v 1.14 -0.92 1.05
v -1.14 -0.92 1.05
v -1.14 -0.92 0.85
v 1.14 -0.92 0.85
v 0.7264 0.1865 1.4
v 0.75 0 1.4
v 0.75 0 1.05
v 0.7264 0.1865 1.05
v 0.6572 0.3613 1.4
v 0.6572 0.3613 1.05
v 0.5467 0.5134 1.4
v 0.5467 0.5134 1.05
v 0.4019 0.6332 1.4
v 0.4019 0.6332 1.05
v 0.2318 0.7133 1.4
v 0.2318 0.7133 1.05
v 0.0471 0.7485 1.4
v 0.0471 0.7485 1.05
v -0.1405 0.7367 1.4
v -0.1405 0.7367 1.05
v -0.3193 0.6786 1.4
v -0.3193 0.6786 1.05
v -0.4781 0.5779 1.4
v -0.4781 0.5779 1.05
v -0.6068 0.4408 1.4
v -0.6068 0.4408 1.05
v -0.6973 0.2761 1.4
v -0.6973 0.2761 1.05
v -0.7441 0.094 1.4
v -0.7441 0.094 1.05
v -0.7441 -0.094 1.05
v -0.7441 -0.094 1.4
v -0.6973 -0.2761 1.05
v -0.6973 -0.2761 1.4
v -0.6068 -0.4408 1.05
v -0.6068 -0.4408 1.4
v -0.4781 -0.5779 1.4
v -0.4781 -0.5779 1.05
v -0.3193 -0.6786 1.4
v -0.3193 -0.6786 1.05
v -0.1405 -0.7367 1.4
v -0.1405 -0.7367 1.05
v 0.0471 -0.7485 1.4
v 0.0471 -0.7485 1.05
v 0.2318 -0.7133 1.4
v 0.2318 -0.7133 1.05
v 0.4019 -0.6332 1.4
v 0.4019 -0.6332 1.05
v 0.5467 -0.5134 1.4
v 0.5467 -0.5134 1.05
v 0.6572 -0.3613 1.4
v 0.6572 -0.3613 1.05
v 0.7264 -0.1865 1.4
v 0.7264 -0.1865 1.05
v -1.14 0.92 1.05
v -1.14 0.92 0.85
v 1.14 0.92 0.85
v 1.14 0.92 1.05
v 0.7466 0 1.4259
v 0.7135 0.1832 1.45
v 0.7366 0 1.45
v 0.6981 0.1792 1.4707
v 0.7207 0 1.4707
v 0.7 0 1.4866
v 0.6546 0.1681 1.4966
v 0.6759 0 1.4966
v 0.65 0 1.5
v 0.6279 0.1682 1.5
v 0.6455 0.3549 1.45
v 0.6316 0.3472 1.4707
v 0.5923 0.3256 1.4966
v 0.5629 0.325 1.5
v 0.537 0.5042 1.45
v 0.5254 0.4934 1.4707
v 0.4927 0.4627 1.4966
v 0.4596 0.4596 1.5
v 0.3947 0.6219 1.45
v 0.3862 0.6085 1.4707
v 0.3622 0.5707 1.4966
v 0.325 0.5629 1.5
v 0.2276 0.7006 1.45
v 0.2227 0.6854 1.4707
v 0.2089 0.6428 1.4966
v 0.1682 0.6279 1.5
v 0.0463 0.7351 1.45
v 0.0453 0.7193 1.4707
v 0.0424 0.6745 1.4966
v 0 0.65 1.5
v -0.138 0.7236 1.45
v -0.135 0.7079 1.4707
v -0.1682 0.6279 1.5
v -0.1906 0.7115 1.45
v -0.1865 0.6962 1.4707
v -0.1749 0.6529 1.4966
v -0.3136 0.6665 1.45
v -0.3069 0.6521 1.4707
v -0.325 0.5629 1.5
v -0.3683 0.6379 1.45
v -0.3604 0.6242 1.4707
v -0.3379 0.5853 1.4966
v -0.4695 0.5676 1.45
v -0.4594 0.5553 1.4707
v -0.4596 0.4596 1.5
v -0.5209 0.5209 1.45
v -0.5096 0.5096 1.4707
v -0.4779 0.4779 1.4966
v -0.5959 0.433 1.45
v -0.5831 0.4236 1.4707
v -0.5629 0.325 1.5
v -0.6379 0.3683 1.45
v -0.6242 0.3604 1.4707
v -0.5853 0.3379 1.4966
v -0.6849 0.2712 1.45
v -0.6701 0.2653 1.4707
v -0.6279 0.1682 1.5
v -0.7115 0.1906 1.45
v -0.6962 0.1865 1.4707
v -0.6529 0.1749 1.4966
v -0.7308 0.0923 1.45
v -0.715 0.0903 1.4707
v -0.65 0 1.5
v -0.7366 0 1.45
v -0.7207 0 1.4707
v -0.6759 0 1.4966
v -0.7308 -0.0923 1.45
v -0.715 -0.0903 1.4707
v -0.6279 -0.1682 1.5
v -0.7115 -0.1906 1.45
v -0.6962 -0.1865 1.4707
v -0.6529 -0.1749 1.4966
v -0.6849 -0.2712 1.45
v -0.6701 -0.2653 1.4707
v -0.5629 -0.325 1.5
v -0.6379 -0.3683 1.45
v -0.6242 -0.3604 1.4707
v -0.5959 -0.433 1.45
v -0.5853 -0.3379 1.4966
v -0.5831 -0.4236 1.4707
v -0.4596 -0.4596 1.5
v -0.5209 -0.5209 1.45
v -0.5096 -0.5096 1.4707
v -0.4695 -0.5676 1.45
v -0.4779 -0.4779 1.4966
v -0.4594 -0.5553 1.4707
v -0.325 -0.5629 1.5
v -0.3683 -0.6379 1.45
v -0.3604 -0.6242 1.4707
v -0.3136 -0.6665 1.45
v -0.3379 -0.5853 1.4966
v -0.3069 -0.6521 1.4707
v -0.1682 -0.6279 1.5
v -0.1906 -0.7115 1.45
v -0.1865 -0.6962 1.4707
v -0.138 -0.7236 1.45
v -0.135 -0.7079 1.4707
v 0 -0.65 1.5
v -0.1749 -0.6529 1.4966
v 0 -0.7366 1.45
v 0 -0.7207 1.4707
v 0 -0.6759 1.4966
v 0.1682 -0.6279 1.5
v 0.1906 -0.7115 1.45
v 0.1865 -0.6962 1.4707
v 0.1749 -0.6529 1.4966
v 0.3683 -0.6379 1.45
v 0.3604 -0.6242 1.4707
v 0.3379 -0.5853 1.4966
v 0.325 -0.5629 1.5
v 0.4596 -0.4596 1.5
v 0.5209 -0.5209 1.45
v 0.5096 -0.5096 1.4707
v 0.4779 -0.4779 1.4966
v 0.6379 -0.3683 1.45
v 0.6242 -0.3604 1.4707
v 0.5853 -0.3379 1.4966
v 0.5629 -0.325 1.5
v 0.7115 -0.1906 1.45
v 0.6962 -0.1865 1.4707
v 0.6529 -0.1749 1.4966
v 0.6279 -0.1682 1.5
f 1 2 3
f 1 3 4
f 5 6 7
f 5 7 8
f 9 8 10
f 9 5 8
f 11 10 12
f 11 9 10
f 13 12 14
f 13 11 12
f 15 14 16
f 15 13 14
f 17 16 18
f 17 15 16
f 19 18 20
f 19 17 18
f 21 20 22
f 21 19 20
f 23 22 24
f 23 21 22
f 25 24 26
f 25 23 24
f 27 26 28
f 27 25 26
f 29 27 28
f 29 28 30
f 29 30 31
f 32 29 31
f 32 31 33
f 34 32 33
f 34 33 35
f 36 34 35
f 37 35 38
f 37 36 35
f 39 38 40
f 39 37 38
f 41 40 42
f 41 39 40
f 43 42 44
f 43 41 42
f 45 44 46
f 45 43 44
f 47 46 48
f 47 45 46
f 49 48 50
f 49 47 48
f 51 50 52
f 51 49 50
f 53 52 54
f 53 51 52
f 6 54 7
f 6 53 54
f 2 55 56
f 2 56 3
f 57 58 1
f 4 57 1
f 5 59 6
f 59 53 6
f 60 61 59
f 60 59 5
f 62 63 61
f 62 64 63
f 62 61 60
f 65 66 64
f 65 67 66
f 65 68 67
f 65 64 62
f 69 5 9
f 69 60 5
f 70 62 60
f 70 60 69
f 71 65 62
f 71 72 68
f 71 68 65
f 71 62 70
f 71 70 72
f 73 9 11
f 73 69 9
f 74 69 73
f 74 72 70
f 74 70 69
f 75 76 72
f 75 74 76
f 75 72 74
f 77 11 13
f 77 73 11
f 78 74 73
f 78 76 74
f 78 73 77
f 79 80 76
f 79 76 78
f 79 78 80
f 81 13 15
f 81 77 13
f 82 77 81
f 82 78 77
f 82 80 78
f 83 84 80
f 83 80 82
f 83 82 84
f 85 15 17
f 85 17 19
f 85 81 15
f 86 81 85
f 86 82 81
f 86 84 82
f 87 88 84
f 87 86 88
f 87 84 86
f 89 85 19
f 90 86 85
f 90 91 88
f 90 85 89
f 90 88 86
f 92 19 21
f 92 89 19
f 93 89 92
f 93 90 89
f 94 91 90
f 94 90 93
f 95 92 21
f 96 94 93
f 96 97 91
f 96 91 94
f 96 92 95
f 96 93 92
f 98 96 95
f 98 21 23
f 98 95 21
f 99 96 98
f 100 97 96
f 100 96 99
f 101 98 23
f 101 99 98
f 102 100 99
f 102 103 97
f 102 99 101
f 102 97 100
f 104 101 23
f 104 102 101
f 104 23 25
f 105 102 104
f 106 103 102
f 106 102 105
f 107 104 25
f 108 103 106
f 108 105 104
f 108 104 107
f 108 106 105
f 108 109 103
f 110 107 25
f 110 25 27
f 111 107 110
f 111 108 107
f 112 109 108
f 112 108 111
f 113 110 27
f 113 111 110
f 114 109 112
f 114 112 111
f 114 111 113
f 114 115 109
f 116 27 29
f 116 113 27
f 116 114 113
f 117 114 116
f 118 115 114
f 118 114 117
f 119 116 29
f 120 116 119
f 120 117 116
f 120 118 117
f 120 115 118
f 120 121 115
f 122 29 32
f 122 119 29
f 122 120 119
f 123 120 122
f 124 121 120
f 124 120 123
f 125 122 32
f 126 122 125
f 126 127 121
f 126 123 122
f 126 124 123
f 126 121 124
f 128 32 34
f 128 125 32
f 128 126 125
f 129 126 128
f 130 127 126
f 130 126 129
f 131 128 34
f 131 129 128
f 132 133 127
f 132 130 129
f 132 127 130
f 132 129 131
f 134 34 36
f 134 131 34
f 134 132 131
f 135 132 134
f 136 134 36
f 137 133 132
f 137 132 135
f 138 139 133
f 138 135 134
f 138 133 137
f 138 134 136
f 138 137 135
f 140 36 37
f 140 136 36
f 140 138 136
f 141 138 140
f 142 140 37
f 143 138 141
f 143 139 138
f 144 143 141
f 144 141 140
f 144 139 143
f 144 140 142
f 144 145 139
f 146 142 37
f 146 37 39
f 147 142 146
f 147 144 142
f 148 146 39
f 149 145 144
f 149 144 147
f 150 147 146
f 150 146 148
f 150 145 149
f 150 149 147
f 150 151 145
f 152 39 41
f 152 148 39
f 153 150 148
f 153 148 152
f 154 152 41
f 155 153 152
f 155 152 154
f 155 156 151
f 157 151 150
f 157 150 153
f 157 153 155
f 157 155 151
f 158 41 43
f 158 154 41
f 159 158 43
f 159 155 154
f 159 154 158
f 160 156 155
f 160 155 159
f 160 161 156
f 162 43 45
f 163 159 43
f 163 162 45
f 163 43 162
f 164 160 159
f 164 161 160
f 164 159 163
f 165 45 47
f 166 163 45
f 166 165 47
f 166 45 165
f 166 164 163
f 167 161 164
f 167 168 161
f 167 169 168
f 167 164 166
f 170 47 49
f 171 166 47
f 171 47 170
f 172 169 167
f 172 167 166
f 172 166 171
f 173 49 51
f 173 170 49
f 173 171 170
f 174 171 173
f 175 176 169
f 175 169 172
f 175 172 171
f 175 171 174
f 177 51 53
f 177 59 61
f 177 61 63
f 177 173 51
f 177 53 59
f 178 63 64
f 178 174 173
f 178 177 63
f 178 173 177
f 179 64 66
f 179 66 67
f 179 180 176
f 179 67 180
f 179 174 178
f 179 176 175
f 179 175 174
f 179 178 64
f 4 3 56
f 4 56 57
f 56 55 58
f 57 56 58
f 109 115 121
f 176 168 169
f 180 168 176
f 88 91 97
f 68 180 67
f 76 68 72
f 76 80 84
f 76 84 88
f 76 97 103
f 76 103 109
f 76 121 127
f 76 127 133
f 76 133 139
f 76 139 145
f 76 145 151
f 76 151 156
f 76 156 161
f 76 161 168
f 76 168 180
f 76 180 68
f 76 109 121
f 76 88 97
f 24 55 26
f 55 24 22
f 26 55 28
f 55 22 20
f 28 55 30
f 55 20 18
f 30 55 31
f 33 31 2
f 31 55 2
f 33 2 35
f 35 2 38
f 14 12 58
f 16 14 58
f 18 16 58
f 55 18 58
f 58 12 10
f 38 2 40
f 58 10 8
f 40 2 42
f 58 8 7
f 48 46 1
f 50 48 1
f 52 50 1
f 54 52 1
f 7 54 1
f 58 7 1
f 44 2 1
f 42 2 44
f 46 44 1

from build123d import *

# Parameters (mm, degrees)
SKETCH050_R  = 0.75
PAD031_DEPTH = 0.45
SKETCH051_W  = 2.28
SKETCH051_H  = 1.84
PAD032_DEPTH = 0.2
FILLET007_R  = 0.1


with BuildPart() as part:
    # Sketch050 (on DatumPlane) → Pad031 (new body)
    with BuildSketch(Plane.XY.offset(1.5)):
        Circle(SKETCH050_R)
    extrude(amount=-PAD031_DEPTH)

    # Sketch051 (on Face3 of Pad031) → Pad032 (join)
    with BuildSketch(Plane(origin=(0, 0, 1.05), x_dir=(1, 0, 0), z_dir=(0, 0, -1))):
        Rectangle(SKETCH051_W, SKETCH051_H)
    extrude(amount=PAD032_DEPTH)

    # Fillet007
    fillet007_edges = [part.edges().sort_by_distance(p)[0] for p in [
        (-0.75, 0, 1.5),
    ]]
    fillet(fillet007_edges, radius=FILLET007_R)


solid = part.part
